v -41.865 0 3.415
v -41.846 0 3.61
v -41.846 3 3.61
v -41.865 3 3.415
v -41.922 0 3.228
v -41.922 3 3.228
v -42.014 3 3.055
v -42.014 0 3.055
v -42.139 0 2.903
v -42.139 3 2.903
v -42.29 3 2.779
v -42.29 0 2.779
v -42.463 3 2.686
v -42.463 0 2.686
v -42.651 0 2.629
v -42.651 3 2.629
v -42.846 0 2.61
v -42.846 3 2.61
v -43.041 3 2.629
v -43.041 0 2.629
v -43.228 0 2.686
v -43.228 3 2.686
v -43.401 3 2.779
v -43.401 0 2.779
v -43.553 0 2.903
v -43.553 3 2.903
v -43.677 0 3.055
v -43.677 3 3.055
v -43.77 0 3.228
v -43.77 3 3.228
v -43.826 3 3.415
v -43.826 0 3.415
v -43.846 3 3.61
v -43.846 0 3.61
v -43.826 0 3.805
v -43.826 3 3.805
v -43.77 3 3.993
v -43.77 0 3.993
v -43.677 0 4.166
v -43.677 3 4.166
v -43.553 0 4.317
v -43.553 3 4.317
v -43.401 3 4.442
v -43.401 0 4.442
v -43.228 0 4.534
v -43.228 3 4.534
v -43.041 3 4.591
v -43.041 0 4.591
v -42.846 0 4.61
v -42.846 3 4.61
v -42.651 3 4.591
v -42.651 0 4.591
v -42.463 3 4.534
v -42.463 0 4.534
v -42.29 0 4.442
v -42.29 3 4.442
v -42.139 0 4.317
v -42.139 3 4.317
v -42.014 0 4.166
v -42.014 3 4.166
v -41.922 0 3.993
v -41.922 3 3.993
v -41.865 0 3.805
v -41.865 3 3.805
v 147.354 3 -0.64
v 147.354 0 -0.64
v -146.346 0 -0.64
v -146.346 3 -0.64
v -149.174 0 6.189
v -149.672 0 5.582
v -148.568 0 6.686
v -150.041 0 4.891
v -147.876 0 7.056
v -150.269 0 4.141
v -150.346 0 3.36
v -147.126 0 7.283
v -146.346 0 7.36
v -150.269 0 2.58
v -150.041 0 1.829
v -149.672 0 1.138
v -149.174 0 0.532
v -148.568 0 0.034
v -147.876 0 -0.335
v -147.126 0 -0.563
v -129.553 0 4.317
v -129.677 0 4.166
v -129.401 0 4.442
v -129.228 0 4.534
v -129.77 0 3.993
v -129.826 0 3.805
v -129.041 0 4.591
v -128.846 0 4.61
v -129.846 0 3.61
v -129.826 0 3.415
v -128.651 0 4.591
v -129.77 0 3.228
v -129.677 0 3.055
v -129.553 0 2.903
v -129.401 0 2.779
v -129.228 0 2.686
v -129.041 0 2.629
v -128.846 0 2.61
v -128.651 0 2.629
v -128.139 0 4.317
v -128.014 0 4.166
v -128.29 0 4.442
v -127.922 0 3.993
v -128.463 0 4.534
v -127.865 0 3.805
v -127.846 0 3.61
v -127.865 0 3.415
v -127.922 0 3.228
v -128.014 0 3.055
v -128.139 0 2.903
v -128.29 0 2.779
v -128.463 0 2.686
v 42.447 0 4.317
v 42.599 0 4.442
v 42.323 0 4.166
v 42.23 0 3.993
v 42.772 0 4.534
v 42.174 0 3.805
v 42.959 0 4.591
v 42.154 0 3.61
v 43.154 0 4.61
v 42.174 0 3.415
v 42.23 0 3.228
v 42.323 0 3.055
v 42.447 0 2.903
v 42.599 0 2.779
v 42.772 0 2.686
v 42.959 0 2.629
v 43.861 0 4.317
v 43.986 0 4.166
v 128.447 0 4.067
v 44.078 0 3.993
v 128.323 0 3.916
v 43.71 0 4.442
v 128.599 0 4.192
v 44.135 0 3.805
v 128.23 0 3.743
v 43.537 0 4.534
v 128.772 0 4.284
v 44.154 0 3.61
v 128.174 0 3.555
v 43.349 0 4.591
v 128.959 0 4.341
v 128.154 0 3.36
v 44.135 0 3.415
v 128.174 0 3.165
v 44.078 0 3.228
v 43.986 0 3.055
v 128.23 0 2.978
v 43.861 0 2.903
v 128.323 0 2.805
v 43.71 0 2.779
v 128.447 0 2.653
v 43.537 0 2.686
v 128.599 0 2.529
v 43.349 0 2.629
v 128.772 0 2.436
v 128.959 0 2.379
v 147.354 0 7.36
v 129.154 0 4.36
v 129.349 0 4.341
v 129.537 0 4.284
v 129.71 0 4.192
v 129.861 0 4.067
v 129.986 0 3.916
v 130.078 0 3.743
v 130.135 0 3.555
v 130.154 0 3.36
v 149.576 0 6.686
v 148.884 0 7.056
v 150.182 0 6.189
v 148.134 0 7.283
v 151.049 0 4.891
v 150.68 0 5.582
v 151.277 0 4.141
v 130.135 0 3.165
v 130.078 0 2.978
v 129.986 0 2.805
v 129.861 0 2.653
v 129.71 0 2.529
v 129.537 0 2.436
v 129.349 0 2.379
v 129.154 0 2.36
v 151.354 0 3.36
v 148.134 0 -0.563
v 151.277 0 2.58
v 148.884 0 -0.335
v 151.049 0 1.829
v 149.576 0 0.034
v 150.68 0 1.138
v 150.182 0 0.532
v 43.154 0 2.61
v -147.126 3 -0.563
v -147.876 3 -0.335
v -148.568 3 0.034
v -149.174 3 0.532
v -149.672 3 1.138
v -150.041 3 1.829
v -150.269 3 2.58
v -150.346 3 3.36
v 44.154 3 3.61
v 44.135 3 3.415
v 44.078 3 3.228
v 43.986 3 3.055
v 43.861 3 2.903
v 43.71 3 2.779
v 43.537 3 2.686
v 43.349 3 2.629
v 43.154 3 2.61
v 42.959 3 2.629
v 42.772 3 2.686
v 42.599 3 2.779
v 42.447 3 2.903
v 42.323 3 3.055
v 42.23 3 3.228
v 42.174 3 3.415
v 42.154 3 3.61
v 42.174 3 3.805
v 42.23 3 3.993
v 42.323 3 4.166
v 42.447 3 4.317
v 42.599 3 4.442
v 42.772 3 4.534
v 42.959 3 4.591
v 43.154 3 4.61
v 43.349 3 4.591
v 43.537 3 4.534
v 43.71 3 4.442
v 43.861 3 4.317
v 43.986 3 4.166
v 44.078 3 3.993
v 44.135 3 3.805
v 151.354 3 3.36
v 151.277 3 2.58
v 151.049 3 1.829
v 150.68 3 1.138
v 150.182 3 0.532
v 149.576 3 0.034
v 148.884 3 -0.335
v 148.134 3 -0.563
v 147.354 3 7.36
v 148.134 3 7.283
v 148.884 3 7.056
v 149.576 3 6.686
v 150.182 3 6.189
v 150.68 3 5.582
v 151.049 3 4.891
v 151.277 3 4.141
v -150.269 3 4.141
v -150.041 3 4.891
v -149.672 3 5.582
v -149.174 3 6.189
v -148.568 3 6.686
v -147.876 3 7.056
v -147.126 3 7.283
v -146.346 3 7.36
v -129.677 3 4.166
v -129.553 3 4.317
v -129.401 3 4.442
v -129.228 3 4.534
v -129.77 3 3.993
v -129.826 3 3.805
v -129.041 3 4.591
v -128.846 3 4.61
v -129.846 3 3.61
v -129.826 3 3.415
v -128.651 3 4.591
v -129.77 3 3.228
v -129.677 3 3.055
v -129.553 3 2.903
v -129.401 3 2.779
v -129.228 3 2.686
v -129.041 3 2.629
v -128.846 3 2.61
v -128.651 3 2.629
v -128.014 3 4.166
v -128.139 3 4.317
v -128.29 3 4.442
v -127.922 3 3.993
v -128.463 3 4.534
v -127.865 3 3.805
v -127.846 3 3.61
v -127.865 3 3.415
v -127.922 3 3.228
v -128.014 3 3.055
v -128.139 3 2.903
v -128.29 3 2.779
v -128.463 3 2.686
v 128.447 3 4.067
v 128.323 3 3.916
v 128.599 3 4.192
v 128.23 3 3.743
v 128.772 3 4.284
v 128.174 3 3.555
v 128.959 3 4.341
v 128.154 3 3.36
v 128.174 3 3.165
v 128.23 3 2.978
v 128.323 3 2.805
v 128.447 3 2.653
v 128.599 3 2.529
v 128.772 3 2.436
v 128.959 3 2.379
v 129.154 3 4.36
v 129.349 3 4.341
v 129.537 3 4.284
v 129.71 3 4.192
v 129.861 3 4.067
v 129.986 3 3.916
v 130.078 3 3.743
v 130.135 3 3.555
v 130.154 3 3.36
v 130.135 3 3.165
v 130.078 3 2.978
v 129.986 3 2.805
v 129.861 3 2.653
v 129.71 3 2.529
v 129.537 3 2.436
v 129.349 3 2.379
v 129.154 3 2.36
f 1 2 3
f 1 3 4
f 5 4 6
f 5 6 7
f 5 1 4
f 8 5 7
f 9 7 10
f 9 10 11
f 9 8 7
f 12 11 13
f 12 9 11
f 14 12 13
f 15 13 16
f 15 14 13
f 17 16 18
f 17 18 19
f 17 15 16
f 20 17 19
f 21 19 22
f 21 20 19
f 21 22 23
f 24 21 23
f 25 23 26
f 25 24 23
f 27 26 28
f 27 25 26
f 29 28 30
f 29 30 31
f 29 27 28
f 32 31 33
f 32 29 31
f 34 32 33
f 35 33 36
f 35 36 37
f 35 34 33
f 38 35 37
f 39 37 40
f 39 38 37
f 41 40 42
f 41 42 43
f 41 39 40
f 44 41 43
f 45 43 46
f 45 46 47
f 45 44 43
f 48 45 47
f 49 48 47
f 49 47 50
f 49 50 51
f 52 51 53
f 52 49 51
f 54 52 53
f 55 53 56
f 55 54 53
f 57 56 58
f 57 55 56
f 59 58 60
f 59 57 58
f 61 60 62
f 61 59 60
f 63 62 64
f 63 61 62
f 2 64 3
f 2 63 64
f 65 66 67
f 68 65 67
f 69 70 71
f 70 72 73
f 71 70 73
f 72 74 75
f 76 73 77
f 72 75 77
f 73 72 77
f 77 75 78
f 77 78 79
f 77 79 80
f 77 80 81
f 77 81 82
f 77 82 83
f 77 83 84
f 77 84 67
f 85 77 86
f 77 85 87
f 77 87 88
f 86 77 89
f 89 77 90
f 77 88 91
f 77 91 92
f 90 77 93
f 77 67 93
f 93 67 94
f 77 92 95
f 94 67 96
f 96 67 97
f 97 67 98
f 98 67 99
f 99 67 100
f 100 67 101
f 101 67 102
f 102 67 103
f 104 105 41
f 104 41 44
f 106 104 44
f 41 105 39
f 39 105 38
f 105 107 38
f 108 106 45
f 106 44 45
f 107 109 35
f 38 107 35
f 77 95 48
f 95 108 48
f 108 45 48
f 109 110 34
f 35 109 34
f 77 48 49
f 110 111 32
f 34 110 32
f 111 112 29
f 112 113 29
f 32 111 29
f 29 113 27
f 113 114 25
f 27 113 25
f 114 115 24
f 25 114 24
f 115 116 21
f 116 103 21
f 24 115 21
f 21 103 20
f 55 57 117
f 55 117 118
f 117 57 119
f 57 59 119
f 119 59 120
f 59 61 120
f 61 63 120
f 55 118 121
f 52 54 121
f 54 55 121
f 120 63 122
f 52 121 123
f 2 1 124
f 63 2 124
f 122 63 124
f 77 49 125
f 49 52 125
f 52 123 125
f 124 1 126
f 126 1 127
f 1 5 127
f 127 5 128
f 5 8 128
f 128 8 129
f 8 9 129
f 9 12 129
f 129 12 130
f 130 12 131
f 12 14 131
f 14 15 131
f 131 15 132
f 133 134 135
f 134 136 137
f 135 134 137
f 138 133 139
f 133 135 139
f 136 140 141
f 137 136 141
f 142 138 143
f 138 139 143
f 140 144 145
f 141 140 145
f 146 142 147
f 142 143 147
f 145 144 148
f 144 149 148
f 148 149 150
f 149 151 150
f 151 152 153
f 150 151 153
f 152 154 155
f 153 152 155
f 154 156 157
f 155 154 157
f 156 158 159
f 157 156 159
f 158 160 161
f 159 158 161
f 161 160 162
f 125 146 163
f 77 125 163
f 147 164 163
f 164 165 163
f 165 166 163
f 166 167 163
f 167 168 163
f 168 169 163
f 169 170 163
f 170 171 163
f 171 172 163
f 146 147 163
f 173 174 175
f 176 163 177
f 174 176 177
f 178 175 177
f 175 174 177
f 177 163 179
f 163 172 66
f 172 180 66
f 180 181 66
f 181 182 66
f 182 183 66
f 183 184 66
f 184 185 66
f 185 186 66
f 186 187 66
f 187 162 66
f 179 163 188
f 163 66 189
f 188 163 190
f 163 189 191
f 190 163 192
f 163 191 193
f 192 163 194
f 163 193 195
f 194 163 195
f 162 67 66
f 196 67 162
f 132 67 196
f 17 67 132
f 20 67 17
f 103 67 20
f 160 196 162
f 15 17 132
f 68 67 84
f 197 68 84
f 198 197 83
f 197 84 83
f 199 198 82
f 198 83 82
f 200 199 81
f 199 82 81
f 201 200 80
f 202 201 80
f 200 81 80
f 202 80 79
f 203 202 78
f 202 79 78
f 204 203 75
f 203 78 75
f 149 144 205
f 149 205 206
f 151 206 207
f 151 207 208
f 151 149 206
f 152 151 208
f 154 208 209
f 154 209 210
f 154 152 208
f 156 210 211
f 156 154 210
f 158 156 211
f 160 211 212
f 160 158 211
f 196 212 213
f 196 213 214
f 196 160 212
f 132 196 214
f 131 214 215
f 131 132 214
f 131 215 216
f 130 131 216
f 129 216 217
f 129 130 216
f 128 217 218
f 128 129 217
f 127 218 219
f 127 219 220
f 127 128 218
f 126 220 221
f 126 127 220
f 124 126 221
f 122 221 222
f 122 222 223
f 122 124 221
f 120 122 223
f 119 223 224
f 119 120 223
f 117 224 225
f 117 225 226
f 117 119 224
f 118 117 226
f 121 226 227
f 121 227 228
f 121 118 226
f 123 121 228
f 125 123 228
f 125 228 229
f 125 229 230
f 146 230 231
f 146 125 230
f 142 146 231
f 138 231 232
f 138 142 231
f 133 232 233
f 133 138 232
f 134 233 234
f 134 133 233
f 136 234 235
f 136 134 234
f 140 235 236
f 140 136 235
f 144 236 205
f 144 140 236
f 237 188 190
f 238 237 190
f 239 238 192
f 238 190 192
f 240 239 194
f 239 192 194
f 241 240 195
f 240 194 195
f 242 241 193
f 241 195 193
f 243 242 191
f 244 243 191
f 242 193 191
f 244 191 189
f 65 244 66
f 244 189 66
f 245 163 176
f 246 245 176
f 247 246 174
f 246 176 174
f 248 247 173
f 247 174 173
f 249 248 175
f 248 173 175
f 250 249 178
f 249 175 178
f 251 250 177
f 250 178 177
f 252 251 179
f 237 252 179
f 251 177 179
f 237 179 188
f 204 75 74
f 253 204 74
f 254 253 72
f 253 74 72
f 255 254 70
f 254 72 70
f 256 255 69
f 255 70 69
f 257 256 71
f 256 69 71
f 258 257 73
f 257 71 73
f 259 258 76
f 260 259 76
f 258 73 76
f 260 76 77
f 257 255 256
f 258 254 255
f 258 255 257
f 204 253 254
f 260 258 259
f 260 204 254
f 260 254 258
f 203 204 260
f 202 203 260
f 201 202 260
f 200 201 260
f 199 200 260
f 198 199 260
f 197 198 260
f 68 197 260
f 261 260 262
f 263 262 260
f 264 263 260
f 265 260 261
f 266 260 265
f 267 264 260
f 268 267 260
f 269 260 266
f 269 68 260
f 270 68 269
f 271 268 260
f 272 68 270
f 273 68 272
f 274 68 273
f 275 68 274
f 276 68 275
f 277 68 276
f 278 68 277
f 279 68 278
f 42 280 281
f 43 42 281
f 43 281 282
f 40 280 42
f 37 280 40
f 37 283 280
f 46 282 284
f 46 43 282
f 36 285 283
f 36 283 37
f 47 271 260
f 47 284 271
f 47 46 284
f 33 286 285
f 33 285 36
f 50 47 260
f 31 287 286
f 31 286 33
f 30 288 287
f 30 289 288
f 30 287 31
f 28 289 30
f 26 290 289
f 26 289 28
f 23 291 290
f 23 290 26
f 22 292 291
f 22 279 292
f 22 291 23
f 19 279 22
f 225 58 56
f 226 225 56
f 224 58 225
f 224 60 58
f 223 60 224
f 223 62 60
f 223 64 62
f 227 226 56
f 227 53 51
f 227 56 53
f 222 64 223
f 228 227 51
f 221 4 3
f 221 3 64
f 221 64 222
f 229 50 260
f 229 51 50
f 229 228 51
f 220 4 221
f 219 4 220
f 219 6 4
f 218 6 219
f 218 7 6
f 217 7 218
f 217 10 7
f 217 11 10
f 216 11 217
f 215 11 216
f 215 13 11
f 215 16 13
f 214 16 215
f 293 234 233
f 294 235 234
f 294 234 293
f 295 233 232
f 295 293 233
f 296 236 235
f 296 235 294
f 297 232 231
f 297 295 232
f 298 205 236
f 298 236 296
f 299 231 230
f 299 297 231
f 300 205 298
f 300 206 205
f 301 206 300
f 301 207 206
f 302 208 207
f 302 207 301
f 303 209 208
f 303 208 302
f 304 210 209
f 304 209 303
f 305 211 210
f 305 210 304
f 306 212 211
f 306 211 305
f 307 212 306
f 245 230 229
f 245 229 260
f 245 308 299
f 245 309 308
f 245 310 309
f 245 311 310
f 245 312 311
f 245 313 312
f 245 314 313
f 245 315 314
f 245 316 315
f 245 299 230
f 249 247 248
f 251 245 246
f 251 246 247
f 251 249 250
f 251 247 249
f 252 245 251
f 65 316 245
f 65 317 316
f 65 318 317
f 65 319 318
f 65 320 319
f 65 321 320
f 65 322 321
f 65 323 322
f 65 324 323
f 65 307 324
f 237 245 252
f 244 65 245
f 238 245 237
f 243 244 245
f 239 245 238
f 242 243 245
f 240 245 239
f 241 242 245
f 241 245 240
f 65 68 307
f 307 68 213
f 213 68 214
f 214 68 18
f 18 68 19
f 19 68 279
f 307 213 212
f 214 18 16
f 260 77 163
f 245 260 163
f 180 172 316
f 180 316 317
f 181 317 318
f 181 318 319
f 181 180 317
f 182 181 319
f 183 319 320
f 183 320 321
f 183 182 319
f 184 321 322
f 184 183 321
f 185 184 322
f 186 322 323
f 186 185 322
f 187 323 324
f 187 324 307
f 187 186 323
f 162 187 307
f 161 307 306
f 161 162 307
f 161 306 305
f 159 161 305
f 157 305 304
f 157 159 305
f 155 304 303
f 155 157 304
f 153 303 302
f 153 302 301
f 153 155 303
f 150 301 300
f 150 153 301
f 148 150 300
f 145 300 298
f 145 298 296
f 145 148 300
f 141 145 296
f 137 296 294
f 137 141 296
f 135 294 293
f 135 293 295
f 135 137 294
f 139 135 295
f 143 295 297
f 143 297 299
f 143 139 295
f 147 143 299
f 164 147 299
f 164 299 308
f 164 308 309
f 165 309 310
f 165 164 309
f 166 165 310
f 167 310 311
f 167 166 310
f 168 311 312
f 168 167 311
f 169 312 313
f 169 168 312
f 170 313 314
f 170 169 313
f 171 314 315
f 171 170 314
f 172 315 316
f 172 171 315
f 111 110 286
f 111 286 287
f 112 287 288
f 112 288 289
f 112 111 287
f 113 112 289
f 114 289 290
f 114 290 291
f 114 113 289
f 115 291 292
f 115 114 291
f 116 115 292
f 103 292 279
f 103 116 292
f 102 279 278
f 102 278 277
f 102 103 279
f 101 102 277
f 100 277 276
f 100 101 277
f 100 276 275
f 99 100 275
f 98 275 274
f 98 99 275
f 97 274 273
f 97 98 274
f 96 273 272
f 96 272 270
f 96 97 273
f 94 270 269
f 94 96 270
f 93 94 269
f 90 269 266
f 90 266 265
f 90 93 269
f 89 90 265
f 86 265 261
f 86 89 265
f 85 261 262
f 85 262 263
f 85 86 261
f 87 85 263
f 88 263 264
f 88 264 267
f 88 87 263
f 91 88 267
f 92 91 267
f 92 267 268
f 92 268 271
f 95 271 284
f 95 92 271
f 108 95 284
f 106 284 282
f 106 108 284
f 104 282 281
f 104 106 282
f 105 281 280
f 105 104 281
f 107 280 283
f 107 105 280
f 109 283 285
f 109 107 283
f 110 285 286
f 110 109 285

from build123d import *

# Parameters (mm, degrees)
SKETCH1_R           = 1
BOSS_EXTRUDE1_DEPTH = 3


with BuildPart() as part:
    # Sketch1 → Boss-Extrude1 (new body)
    with BuildSketch(Plane(origin=(0, 0, 0), x_dir=(1, 0, 0), z_dir=(0, 1, 0))):
        with BuildLine():
            Line((-146.345646623, -7.360189179), (147.353703377, -7.360189179))
            ThreePointArc((147.353703377, -7.360189179), (150.182130502, -6.188616304), (151.353703377, -3.360189179))
            ThreePointArc((151.353703377, -3.360189179), (150.182130502, -0.531762055), (147.353703377, 0.639810821))
            Line((147.353703377, 0.639810821), (-146.345646623, 0.639810821))
            ThreePointArc((-146.345646623, 0.639810821), (-149.174073748, -0.531762055), (-150.345646623, -3.360189179))
            ThreePointArc((-150.345646623, -3.360189179), (-149.174073748, -6.188616304), (-146.345646623, -7.360189179))
        make_face()
        with Locations((-128.845646623, -3.610189179)):
            Circle(SKETCH1_R, mode=Mode.SUBTRACT)
        with Locations((-42.845646623, -3.610189179)):
            Circle(SKETCH1_R, mode=Mode.SUBTRACT)
        with Locations((43.154353377, -3.610189179)):
            Circle(SKETCH1_R, mode=Mode.SUBTRACT)
        with Locations((129.154353377, -3.360189179)):
            Circle(SKETCH1_R, mode=Mode.SUBTRACT)
    extrude(amount=BOSS_EXTRUDE1_DEPTH)


solid = part.part
